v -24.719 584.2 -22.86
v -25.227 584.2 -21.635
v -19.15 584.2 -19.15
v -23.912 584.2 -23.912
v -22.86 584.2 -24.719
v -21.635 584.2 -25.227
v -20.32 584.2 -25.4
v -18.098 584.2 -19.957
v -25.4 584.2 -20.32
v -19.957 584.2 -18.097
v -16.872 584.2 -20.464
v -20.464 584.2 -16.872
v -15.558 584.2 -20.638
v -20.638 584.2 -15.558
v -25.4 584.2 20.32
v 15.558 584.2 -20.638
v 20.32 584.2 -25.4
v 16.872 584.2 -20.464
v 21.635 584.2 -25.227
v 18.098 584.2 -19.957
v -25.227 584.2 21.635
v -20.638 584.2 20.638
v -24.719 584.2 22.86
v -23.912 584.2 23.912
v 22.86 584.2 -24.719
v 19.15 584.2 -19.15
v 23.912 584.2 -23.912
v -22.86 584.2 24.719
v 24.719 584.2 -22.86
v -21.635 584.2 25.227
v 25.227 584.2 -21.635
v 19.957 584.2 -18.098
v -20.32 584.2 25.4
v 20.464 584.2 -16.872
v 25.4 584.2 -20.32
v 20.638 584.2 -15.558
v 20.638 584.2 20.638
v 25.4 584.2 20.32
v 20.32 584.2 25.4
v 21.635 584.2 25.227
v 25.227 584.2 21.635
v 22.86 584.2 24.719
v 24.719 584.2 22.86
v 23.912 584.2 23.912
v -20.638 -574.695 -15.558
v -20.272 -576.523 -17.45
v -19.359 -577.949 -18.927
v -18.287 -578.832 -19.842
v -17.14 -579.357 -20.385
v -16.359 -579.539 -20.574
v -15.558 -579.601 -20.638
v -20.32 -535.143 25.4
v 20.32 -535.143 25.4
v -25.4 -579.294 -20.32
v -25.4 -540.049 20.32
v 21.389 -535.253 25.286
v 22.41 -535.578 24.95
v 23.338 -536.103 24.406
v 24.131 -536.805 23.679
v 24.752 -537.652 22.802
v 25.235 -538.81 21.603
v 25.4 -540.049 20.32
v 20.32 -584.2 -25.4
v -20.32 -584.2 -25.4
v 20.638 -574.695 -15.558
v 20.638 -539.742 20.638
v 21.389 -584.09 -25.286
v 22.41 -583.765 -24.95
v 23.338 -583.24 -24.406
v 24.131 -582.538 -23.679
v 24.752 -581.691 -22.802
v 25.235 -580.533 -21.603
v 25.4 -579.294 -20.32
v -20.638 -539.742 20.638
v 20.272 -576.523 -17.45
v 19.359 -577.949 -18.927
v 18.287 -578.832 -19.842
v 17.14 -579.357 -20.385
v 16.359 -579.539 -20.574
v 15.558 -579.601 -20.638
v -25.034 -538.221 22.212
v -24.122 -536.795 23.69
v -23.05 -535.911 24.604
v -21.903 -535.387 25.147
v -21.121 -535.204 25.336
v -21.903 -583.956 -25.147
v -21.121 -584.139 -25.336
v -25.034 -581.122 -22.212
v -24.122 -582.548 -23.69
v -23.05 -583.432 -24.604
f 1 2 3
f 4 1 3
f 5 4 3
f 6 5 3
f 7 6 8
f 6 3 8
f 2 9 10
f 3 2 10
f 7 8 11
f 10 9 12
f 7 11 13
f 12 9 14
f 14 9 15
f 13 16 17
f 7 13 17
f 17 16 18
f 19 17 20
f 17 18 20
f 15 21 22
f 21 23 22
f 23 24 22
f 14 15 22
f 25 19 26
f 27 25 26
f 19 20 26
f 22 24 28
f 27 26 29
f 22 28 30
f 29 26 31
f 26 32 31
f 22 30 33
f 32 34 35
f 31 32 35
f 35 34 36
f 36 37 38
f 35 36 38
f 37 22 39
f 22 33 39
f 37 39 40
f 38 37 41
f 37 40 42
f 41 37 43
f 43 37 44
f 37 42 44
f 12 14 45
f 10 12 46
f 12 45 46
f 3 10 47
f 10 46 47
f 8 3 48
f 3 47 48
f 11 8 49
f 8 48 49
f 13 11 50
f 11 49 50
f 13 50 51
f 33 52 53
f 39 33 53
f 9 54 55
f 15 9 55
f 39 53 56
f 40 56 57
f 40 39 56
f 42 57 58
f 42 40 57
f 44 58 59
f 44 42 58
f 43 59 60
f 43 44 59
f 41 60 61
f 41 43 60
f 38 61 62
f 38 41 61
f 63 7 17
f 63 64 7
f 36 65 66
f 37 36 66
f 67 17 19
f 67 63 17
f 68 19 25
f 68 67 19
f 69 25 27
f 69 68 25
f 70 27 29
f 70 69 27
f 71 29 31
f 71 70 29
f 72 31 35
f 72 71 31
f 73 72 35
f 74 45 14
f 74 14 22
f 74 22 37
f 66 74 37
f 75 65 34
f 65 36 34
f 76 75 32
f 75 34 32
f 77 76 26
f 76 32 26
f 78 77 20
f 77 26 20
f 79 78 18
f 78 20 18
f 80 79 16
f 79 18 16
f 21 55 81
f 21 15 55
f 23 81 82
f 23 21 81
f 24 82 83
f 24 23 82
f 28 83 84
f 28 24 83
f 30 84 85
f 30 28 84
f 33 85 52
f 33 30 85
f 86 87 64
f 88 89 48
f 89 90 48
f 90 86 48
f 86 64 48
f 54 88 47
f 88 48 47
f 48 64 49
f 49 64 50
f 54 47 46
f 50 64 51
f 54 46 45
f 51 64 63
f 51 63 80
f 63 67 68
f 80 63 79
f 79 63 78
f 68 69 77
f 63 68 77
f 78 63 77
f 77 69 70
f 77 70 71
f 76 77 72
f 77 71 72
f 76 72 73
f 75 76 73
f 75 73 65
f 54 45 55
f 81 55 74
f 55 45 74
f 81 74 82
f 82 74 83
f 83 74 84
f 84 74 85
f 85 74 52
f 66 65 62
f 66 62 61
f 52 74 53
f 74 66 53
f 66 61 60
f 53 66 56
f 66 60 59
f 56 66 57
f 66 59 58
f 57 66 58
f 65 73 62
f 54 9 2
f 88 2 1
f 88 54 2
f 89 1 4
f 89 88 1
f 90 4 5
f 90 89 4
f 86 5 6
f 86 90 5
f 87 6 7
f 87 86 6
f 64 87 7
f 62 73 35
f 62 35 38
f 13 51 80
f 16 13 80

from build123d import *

# Parameters (mm, degrees)
F0_W     = 50.8
F0_H     = 50.8
F0_W_2   = 41.275
F0_H_2   = 41.275
F1_DEPTH = 584.2
F3_DEPTH = 50.8
F4_R     = 5.08


with BuildPart() as f1:
    # F0 (on Front) → F1 (new body, symmetric)
    with BuildSketch(Plane.XZ):
        Rectangle(F0_W, F0_H)
        Rectangle(F0_W_2, F0_H_2, mode=Mode.SUBTRACT)
    extrude(amount=F1_DEPTH, both=True)

    # F2 (on face) → F3 (cut)
    with BuildSketch(Plane.YZ.offset(25.4)):
        Polygon((-584.2, 25.4), (-584.2, -25.4), (-535.14301, 25.4), align=None)
    extrude(amount=-F3_DEPTH, mode=Mode.SUBTRACT)

    # F4
    f4_edges = [f1.edges().sort_by_distance(p)[0] for p in [
        (-25.4, 24.528495, 25.4),
        (25.4, 24.528495, 25.4),
        (20.6375, 2.299546, -20.6375),
        (-20.6375, 2.299546, -20.6375),
        (-25.4, 0, -25.4),
        (25.4, 0, -25.4),
    ]]
    fillet(f4_edges, radius=F4_R)


solid = f1.part
